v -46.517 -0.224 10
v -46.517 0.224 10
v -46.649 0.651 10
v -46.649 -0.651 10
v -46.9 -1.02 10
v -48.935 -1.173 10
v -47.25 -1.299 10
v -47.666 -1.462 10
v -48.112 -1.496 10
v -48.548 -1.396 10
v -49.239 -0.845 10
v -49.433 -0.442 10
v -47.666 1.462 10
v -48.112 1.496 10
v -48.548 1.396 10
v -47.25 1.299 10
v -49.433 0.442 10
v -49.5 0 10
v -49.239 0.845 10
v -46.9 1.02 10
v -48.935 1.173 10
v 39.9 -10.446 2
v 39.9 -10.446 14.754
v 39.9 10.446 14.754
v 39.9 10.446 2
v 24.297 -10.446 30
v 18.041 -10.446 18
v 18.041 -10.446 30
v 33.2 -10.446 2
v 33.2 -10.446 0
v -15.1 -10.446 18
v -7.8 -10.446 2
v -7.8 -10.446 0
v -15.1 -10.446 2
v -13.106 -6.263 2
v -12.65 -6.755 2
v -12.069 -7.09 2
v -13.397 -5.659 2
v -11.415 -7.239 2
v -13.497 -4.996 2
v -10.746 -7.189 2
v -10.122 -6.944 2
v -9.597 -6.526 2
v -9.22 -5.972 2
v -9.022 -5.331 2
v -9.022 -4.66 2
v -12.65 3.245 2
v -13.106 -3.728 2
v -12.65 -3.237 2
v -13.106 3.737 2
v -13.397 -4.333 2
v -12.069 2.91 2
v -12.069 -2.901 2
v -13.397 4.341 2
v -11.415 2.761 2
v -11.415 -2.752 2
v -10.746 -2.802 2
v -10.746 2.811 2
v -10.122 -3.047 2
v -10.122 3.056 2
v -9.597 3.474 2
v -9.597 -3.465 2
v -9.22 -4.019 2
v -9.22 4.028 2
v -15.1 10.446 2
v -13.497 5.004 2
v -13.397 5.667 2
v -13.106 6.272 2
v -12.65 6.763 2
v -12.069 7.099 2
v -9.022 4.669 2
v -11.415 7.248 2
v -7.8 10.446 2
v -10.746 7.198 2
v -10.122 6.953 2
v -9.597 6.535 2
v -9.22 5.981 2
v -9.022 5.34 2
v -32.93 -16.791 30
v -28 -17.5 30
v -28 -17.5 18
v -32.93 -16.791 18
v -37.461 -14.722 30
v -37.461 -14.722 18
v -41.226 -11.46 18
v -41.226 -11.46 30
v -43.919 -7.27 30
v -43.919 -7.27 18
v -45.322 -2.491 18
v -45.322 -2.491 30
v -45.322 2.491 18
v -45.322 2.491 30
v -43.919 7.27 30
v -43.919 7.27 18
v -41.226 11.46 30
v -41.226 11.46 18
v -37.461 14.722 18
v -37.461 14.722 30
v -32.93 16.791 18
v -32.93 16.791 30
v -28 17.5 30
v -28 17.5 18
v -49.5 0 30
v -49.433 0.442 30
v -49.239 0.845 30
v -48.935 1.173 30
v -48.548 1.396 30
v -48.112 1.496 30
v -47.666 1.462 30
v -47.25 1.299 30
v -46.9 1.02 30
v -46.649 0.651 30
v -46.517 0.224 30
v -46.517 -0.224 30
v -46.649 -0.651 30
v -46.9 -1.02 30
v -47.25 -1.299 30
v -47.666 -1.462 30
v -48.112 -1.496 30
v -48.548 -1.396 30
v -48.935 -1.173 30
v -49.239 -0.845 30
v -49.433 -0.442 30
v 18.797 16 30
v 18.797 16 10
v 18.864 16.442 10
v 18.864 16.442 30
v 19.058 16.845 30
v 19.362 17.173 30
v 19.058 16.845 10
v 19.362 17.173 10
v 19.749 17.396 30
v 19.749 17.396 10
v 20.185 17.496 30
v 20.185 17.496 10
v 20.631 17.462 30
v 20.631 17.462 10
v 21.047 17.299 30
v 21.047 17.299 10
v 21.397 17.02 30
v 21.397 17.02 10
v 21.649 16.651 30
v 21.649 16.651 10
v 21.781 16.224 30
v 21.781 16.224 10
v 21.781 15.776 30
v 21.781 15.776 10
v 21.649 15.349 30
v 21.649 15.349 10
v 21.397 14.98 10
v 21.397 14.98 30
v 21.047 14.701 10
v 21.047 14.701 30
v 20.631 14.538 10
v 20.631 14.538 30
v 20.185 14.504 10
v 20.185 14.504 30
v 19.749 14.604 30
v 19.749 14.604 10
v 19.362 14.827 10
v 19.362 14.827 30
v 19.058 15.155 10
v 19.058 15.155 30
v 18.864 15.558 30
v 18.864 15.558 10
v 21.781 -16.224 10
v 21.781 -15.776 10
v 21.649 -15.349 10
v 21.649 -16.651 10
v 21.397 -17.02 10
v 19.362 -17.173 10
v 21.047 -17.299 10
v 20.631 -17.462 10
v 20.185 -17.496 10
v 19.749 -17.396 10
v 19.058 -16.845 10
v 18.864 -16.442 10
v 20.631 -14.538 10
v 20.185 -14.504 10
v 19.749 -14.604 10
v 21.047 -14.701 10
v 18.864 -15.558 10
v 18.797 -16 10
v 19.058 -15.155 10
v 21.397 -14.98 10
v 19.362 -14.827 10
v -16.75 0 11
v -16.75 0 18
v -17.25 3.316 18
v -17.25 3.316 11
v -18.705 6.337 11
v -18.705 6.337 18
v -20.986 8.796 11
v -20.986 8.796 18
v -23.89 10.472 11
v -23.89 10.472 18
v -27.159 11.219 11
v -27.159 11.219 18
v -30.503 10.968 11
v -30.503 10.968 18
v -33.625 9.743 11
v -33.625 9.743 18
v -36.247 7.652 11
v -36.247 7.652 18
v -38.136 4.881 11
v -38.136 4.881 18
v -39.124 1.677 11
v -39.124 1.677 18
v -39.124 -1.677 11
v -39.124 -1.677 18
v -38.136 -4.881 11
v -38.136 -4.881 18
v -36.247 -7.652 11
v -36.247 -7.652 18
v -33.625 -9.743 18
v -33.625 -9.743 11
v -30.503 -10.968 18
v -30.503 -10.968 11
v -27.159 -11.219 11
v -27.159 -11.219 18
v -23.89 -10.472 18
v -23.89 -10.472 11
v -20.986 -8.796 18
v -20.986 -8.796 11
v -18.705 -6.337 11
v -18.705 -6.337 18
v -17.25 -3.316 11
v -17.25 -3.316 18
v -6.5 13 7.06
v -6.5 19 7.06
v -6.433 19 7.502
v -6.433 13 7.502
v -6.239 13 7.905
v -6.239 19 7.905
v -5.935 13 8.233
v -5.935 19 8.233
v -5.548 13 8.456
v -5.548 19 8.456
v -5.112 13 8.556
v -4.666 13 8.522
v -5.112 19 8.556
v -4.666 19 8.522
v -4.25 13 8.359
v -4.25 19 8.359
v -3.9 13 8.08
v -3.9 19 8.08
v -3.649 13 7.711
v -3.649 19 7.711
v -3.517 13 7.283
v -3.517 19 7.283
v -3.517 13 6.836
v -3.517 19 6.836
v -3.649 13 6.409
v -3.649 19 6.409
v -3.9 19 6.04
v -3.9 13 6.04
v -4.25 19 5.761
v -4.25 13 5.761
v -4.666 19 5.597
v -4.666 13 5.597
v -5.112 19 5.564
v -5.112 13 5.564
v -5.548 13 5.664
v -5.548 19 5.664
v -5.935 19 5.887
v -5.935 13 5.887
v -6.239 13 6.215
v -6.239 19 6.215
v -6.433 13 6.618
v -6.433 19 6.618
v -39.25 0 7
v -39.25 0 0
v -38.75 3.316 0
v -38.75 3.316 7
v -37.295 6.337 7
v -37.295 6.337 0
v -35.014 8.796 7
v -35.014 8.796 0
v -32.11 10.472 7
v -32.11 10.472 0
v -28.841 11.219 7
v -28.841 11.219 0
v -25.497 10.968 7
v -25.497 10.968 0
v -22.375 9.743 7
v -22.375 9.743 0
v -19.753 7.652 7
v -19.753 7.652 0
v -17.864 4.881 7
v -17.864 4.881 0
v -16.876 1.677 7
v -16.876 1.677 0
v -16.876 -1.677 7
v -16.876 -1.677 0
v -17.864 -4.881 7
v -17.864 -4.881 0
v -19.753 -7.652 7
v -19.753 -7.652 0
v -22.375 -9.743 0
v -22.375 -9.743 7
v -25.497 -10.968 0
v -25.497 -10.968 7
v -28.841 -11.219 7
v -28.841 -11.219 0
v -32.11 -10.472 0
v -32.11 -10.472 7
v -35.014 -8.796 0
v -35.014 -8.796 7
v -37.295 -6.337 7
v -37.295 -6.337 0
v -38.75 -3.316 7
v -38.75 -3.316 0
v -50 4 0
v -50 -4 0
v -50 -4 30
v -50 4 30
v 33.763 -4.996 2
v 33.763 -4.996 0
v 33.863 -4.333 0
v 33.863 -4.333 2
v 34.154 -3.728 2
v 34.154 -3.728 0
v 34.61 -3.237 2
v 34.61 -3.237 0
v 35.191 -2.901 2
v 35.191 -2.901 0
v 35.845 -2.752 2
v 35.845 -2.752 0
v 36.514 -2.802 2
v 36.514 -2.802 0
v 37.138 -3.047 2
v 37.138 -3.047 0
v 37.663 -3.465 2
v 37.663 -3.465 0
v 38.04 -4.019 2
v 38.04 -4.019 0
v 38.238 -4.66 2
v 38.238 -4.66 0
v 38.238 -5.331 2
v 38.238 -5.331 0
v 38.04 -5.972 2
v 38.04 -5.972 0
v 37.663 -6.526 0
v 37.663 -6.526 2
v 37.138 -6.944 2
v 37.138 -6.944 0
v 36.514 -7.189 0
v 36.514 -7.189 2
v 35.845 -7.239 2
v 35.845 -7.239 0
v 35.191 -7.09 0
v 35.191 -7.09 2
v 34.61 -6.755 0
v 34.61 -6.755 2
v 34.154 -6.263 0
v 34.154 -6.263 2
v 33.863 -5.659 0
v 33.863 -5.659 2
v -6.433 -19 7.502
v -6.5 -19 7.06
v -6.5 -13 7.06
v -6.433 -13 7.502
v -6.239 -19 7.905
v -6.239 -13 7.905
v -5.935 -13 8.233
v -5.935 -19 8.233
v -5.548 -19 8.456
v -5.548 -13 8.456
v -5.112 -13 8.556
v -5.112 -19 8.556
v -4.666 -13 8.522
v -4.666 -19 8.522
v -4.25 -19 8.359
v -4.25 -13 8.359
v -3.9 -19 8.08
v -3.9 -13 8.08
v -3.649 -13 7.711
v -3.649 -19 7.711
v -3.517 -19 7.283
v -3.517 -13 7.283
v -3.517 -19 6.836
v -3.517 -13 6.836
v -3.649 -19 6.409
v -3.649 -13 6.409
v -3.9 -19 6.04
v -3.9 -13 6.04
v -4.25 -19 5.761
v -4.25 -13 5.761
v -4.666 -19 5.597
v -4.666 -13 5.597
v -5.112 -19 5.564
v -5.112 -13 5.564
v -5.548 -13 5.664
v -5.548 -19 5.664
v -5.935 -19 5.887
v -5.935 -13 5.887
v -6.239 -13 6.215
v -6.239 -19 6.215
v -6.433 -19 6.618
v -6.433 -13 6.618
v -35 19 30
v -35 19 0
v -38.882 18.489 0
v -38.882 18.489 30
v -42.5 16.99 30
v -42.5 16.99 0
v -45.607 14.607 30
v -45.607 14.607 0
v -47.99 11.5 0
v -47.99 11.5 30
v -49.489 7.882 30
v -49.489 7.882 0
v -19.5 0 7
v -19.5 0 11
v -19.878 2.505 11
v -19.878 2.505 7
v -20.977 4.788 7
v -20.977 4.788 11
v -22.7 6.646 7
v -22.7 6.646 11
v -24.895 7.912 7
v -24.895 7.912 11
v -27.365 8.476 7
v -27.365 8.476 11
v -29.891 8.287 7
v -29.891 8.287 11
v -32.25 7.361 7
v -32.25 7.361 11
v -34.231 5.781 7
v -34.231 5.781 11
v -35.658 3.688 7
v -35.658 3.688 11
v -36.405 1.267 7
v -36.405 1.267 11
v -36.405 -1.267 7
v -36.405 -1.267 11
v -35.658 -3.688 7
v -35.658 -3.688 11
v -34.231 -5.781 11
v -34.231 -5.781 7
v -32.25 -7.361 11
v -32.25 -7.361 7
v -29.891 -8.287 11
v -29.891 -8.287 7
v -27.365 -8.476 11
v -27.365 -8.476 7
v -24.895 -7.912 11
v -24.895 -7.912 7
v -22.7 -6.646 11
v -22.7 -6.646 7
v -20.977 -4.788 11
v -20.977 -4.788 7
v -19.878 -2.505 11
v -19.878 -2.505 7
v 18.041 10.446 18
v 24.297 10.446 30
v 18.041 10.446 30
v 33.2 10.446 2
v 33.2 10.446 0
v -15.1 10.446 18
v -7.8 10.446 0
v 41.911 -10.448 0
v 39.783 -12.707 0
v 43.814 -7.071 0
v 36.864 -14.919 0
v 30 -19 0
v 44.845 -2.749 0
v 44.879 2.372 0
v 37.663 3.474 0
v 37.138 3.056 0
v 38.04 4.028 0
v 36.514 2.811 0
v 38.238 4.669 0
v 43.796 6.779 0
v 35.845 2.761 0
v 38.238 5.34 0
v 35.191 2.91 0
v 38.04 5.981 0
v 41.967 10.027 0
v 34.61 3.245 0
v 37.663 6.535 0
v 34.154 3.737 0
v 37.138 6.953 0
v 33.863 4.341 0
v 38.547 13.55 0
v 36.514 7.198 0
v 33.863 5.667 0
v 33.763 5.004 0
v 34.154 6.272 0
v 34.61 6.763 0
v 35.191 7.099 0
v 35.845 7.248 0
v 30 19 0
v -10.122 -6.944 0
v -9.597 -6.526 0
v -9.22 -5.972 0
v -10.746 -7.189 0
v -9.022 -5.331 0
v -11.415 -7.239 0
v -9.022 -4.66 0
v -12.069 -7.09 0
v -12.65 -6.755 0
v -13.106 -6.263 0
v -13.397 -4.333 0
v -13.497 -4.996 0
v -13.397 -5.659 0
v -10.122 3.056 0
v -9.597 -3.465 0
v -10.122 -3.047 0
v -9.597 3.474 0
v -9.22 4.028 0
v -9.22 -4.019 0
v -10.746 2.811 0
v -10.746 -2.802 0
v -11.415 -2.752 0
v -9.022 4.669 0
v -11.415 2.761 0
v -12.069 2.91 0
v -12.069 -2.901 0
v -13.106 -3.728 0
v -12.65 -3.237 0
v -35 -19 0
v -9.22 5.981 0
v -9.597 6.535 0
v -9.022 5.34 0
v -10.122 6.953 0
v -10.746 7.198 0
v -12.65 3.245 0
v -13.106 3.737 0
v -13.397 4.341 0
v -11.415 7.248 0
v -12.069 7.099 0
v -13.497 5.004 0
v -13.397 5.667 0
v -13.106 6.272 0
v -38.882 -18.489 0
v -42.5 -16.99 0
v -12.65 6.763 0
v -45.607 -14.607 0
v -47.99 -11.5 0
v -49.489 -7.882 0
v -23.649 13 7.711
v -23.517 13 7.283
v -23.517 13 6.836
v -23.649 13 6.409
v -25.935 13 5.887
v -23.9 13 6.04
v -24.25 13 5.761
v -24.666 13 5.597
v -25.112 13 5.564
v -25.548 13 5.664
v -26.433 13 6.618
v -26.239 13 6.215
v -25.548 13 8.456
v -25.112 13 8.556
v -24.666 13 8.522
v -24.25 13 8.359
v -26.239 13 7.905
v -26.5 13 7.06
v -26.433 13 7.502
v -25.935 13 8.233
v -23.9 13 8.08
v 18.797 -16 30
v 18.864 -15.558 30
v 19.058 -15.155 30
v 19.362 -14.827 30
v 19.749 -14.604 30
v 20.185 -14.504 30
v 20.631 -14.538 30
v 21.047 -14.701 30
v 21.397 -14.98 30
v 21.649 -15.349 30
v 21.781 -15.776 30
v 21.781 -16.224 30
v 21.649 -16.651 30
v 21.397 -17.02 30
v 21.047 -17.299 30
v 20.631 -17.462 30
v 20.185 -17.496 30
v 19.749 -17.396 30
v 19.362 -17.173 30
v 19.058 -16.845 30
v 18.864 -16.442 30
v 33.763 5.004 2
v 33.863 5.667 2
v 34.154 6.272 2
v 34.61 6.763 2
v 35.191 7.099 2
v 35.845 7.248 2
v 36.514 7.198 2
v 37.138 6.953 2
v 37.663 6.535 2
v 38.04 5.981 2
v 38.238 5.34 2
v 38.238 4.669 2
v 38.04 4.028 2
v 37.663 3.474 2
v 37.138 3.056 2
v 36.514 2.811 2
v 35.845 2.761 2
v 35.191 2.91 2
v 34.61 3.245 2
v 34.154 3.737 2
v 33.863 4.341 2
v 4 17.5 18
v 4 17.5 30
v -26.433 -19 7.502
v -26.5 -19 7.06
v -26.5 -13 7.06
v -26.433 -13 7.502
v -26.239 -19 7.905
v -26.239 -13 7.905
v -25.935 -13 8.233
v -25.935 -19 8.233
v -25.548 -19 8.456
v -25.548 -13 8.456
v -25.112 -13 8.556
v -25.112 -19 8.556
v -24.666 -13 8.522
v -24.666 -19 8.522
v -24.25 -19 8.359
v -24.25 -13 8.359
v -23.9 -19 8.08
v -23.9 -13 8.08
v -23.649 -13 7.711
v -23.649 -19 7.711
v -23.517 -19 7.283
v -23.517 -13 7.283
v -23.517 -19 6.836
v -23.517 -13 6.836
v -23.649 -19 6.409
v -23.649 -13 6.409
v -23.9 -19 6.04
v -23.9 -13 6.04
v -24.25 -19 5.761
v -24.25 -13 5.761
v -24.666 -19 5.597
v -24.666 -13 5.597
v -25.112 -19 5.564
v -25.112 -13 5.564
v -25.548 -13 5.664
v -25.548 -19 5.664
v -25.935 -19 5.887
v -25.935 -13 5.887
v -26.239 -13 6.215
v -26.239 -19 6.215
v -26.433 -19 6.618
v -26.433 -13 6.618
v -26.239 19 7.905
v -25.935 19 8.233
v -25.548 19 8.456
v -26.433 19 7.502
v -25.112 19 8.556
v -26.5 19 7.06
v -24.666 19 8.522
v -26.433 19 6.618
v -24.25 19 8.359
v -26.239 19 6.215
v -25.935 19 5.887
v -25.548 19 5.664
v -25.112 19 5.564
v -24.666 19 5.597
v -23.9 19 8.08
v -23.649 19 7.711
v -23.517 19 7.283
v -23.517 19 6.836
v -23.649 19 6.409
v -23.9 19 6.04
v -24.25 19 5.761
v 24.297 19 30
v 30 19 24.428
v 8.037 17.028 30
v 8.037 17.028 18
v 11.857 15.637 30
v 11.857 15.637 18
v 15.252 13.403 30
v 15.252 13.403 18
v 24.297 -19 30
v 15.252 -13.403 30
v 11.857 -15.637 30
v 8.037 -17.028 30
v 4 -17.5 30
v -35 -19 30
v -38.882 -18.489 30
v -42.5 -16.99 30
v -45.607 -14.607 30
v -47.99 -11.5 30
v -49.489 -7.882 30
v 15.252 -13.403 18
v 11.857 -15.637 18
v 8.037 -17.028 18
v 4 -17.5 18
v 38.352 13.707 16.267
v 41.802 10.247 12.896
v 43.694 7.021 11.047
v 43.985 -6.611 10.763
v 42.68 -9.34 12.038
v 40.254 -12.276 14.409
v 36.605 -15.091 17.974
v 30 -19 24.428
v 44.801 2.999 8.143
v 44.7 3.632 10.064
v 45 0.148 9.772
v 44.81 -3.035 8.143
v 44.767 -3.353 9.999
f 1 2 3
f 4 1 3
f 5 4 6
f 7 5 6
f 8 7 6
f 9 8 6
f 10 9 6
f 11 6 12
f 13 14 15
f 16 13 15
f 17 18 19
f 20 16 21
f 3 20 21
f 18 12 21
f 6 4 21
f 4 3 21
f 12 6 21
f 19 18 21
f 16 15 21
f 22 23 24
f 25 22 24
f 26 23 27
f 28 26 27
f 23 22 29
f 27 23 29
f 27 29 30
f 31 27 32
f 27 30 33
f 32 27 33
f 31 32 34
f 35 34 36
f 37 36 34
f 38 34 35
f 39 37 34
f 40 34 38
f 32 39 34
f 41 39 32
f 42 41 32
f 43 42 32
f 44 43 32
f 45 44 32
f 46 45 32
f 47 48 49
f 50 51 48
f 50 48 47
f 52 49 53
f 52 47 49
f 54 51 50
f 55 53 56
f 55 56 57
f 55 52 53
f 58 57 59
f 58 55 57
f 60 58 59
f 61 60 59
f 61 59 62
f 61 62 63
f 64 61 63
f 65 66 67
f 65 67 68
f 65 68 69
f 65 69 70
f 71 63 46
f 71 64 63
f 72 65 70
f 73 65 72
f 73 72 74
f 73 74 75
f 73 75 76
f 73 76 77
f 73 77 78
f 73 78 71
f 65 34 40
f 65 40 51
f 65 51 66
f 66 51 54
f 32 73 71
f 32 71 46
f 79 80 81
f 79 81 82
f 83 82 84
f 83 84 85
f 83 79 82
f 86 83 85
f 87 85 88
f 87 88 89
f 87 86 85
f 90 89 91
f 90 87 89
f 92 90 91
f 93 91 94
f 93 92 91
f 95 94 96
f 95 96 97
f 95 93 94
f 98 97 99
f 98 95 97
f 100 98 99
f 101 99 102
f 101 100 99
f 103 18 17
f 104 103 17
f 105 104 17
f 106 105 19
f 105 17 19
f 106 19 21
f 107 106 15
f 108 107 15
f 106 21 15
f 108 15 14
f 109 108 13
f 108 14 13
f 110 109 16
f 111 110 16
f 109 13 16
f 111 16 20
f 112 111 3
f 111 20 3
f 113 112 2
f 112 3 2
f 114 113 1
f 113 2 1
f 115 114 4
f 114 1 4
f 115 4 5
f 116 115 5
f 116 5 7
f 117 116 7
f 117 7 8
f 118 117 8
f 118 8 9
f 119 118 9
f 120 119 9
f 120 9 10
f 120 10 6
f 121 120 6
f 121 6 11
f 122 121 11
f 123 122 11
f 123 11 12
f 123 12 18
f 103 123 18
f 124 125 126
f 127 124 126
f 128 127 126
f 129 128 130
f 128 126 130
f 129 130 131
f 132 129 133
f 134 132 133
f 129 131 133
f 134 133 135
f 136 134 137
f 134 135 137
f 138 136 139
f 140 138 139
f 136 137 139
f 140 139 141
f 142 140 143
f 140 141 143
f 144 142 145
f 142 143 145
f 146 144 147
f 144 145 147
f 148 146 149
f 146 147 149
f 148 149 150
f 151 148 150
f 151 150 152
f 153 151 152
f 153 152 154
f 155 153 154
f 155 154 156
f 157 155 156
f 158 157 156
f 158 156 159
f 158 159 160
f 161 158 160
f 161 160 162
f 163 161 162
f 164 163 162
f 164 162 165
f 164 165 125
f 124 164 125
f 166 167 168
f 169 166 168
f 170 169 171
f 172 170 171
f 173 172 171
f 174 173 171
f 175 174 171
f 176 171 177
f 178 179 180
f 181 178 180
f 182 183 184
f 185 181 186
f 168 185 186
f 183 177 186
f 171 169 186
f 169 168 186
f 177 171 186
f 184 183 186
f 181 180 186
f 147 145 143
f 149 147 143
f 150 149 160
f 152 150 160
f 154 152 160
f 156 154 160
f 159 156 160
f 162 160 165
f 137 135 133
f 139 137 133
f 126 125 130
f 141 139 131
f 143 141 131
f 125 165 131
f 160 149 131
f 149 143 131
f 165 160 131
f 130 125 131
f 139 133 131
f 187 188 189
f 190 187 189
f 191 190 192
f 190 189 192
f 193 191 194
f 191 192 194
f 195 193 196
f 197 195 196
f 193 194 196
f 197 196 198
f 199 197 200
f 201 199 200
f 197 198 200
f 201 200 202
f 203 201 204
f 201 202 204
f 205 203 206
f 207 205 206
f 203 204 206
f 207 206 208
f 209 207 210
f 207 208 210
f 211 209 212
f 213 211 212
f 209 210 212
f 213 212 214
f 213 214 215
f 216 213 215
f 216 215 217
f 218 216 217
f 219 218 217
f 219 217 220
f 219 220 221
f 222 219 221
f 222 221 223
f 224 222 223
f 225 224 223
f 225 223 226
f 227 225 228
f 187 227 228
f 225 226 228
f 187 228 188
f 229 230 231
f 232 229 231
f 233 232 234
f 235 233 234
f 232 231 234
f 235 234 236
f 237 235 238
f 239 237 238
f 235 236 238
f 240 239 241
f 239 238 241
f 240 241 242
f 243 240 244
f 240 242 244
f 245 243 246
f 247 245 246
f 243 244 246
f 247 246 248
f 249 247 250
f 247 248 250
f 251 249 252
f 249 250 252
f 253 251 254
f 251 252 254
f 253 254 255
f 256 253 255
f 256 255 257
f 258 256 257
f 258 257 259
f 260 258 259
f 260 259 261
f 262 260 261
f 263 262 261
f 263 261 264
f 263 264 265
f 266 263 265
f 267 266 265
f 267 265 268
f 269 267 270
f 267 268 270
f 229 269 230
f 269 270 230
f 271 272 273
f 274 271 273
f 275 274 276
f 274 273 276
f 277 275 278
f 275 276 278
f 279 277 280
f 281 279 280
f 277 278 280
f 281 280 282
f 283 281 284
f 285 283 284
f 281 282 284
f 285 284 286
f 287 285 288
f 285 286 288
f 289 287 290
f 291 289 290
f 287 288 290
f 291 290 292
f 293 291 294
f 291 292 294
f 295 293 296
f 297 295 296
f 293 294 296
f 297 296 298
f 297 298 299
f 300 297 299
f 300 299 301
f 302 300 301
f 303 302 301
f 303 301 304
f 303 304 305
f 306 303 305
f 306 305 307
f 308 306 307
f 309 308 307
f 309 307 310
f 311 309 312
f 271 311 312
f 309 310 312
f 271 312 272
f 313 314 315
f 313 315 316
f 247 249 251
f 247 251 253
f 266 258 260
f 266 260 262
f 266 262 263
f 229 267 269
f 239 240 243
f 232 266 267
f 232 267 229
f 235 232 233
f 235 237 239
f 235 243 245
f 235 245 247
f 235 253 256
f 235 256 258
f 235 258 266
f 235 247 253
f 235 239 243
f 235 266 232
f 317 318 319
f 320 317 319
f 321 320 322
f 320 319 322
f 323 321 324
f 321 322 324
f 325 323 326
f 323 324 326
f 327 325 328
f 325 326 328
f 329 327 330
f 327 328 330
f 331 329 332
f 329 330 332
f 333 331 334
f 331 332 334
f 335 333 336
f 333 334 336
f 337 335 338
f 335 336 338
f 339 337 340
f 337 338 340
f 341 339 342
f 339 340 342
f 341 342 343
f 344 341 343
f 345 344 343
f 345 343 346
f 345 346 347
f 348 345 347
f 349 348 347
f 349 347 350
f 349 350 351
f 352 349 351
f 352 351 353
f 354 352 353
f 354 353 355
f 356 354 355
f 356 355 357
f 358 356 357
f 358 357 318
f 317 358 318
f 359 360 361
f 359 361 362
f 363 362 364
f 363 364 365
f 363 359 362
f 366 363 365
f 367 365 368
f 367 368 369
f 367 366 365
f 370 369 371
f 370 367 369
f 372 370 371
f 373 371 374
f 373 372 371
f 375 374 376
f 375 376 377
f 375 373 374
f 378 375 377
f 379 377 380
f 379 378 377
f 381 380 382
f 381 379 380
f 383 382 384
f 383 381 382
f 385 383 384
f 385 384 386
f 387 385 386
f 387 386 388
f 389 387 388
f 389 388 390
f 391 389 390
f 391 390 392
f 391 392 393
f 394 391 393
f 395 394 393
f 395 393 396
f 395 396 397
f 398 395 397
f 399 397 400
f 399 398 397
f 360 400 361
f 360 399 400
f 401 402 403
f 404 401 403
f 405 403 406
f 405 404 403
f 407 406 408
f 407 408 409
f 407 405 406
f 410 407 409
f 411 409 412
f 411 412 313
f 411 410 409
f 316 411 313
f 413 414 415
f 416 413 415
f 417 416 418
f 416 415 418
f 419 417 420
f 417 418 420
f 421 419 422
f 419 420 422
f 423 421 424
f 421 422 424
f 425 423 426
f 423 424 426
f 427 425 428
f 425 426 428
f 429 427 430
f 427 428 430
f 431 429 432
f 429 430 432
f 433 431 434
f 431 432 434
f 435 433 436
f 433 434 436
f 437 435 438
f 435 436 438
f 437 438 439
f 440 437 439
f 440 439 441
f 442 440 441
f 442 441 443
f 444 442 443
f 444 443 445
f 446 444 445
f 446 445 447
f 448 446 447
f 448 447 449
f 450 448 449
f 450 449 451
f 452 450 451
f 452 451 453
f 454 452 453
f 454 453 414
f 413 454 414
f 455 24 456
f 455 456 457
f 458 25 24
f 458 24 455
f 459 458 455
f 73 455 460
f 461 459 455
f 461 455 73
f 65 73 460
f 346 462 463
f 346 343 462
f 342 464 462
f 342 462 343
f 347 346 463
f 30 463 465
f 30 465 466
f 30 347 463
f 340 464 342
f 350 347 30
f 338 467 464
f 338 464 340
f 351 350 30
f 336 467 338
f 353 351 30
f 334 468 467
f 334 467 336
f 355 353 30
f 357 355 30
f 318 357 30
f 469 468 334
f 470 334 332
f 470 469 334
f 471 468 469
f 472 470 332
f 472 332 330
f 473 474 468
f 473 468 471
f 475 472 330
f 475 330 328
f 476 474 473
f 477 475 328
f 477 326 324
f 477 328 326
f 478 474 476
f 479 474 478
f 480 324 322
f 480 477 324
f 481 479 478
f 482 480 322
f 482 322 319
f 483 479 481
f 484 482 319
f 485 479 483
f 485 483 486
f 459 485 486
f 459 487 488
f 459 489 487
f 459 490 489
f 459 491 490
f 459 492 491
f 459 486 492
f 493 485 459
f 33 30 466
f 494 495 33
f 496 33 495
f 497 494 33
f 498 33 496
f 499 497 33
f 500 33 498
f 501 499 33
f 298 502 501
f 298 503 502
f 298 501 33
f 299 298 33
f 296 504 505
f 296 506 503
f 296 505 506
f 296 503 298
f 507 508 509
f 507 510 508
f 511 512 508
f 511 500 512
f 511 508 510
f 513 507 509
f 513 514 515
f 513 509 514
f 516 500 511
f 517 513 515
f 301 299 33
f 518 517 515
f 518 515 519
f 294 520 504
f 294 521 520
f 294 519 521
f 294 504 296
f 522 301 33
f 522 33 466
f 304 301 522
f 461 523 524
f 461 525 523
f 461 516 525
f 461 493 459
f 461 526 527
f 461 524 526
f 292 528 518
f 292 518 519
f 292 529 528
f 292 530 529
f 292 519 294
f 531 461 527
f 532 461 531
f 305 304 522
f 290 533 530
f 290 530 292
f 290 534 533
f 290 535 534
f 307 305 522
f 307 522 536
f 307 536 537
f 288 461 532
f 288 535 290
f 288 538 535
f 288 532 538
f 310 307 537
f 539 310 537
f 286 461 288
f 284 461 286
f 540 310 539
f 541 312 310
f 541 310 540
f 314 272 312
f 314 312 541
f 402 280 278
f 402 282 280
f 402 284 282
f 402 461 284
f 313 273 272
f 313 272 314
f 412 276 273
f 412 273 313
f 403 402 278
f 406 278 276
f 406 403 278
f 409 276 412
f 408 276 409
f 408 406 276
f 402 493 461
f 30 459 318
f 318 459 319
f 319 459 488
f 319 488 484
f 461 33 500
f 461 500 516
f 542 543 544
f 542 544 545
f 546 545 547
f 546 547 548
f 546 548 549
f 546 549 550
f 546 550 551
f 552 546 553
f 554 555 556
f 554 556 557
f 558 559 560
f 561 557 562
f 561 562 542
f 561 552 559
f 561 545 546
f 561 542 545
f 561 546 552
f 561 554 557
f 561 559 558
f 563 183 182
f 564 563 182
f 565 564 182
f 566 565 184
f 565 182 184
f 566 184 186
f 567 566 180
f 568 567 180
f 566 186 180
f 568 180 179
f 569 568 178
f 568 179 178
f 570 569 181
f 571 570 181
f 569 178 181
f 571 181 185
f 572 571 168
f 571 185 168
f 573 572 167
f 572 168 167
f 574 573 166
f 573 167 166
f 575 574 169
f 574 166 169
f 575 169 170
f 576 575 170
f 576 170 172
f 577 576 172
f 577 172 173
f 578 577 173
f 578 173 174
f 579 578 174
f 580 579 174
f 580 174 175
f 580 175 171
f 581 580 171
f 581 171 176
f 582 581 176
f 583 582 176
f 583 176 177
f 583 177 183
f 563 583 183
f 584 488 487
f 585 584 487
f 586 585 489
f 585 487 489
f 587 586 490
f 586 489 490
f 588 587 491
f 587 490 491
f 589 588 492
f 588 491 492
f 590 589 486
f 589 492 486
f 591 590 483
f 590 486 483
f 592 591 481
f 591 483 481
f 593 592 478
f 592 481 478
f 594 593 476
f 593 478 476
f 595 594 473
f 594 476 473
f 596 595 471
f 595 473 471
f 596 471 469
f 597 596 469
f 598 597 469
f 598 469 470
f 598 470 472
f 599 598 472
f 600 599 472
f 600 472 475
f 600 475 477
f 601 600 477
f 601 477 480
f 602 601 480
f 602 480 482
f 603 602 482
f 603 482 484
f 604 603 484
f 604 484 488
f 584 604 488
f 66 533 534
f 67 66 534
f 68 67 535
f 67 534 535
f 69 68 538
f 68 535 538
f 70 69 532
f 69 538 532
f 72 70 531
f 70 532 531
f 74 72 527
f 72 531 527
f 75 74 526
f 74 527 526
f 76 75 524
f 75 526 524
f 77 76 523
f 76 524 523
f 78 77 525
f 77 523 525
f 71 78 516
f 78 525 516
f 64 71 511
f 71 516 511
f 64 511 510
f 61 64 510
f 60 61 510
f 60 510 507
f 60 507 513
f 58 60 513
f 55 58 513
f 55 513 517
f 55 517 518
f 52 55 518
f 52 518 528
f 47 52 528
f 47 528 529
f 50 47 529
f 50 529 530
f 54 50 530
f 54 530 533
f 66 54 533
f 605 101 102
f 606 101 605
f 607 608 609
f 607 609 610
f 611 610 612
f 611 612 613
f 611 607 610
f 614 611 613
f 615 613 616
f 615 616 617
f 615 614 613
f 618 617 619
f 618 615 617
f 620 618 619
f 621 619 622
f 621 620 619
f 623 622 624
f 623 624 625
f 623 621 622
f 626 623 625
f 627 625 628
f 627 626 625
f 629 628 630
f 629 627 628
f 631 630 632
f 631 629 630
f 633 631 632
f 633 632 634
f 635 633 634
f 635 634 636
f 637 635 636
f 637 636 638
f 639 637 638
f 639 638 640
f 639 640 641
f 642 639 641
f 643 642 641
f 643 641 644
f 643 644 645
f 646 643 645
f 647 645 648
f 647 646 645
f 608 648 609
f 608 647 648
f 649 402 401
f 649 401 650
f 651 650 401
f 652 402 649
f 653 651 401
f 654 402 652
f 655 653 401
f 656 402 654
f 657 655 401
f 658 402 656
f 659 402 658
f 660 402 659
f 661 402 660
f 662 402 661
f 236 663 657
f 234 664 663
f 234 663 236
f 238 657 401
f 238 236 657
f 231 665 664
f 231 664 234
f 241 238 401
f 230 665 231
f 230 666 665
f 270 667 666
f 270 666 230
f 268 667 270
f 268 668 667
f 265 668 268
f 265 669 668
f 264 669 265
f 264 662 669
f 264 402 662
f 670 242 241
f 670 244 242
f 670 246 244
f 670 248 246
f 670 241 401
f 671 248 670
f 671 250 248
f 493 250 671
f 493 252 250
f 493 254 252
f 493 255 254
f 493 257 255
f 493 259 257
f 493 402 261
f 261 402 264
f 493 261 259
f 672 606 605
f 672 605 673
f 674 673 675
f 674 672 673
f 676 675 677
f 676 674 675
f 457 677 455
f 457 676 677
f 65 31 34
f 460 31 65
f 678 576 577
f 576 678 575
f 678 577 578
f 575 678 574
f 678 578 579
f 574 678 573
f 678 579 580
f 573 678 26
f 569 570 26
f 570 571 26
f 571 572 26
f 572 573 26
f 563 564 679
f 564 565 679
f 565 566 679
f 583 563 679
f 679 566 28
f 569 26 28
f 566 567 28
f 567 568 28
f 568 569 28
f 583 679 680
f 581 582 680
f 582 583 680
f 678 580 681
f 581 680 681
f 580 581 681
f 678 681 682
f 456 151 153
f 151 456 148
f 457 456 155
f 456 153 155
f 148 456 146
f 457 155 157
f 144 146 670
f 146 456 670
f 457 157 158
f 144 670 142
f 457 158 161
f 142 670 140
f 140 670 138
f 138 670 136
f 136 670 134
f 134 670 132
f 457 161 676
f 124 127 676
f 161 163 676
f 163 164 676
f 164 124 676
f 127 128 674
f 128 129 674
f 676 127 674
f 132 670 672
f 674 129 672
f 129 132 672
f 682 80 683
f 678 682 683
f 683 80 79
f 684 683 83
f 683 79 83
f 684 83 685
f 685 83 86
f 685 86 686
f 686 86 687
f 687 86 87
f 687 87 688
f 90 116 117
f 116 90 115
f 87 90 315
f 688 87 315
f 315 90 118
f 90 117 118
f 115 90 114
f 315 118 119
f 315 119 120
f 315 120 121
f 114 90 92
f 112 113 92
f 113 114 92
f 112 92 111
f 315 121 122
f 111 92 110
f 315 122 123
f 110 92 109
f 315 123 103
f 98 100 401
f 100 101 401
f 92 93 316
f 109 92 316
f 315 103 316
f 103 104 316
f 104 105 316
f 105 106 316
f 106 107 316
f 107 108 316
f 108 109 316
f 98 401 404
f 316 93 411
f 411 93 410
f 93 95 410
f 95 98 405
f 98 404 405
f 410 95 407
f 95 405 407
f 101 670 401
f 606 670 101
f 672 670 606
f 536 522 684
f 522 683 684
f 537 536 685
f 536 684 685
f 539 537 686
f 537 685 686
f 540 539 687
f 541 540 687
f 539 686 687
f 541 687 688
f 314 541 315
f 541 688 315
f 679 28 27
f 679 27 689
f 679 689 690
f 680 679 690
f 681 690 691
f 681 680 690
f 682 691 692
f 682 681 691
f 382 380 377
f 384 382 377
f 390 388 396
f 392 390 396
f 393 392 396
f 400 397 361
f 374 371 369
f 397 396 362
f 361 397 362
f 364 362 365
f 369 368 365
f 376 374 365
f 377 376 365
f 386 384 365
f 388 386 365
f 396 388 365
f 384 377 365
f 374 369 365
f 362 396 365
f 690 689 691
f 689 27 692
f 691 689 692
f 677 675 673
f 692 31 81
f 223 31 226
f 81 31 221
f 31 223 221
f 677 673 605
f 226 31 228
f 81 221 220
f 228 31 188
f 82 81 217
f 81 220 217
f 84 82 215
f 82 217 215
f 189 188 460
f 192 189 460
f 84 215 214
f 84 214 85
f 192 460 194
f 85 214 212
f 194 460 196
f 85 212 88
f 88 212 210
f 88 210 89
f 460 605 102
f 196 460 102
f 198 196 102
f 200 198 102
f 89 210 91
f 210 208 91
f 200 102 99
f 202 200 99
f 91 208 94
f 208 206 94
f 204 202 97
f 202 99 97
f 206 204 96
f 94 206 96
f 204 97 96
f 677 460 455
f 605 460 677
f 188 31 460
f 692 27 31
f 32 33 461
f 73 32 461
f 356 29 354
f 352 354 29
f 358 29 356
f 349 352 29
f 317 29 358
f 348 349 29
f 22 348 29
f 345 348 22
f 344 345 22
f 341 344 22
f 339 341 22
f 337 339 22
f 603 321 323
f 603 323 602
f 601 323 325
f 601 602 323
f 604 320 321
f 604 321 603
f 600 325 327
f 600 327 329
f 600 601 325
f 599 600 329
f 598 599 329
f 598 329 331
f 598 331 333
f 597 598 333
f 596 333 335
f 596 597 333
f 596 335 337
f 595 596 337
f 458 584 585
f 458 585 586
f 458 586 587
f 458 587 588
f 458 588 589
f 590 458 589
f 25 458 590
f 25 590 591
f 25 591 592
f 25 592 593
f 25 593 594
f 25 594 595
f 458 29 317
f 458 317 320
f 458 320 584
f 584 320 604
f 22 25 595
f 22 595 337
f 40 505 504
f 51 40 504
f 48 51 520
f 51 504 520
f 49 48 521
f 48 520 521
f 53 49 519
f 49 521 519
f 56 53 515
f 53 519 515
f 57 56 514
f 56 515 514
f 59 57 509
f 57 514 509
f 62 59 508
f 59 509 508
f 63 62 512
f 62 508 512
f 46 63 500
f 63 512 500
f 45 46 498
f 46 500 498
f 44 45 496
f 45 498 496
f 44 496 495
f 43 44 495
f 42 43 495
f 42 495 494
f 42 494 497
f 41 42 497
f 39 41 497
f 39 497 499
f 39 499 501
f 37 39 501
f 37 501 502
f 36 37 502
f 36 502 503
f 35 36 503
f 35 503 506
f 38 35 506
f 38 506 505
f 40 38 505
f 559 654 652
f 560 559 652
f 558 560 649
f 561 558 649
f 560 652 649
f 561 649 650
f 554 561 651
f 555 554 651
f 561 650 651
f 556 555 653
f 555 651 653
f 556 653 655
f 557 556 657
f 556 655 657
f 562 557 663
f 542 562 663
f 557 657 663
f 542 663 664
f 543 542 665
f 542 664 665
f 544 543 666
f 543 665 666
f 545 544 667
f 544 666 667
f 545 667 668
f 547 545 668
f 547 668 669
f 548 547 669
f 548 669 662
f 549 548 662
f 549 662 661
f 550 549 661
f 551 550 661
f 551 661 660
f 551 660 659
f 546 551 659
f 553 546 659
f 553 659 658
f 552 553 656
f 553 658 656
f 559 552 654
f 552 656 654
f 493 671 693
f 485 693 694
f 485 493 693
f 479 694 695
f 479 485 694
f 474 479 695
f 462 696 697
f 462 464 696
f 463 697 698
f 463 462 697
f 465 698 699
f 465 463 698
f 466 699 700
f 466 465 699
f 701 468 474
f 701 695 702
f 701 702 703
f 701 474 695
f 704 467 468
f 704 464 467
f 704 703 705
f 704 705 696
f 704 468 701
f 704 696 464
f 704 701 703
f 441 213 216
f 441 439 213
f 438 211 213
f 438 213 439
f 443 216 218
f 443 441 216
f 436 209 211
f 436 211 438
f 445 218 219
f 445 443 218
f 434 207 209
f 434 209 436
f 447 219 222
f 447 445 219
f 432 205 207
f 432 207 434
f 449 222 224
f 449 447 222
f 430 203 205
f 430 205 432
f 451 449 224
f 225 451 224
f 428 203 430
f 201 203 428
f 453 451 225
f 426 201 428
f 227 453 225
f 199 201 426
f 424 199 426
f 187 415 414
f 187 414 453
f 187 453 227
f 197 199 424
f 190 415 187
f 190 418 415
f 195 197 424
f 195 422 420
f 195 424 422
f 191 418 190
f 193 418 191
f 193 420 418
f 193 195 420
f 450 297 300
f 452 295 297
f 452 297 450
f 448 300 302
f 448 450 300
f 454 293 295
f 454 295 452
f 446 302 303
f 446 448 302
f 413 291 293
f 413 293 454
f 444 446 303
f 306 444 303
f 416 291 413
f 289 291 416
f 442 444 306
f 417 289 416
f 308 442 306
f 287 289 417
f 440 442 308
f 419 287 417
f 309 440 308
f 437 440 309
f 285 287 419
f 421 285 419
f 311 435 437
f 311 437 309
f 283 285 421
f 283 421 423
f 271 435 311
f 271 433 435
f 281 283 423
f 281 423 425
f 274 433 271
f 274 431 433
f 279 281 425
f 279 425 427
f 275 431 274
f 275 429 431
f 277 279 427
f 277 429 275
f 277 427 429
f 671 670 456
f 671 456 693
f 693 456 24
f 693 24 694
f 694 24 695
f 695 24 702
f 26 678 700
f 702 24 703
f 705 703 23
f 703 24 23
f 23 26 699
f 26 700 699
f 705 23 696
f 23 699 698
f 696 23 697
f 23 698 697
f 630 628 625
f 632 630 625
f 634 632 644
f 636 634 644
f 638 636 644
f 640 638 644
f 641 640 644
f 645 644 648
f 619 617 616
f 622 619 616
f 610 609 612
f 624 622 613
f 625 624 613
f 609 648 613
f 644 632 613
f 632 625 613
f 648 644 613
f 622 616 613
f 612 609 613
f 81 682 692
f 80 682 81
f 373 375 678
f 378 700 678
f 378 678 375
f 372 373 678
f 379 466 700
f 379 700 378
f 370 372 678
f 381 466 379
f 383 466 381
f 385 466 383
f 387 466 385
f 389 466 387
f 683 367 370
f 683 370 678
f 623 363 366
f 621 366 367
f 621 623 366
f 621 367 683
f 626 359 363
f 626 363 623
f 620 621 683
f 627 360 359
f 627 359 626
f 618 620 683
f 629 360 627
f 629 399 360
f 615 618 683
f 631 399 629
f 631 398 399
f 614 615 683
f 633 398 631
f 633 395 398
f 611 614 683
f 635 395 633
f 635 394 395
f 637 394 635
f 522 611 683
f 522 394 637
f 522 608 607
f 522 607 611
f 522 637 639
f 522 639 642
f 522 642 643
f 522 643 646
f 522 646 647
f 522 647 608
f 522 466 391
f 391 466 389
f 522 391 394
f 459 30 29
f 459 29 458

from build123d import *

# Parameters (mm, degrees)
EXTRUDE1_DEPTH                 = 30
EXTRUDE2_DEPTH                 = 12
SKETCH4_R                      = 11.25
EXTRUDE3_DEPTH                 = 7
SKETCH5_R                      = 8.5
EXTRUDE4_DEPTH                 = 12.0000001
SKETCH6_R                      = 11.25
EXTRUDE5_DEPTH                 = 7
SKETCH8_R                      = 2.5
EXTRUDE6_DEPTH                 = 19.0000001
SKETCH7_W                      = 41
SKETCH7_H                      = 20.891455382
EXTRUDE7_DEPTH                 = 31.0000001
SKETCH10_W                     = 55
SKETCH10_H                     = 20.891455382
EXTRUDE8_DEPTH                 = 28
FILLET1_R                      = 15
EXTRUDE17_DEPTH                = 20.0000001
EXTRUDE17_DEPTH_BACK           = 20.0000001
SKETCH19_R                     = 1.5
EXTRUDE19_DEPTH                = 6
F_4_5_4_5_DIAMETER_HOLE1_D     = 4.5
F_4_5_4_5_DIAMETER_HOLE1_DEPTH = 20
F_3_0_3_DIAMETER_HOLE1_D       = 3
F_3_0_3_DIAMETER_HOLE1_DEPTH   = 20


with BuildPart() as part:
    # Sketch1 → Extrude1 (new body)
    with BuildSketch(Plane.XY):
        with BuildLine():
            Line((-50, 19), (30, 19))
            add(Edge.make_bspline(
                [(30, 19), (36.561245044, 15.211863407), (45.16011468, 10.828695002), (44.967612, -11.088320981), (37.933016475, -14.419870803), (30, -19)],
                knots=[0, 0, 0, 0, 0.44562934, 0.54562934, 1, 1, 1, 1], degree=3))
            Line((30, -19), (-50, -19))
            Line((-50, -19), (-50, 19))
        make_face()
    extrude(amount=EXTRUDE1_DEPTH)

    # Sketch2 → Extrude2 (cut)
    with BuildSketch(Plane.XY.offset(30)):
        with BuildLine():
            Line((-28, 17.5), (4, 17.5))
            ThreePointArc((4, 17.5), (21.5, 0), (4, -17.5))
            Line((4, -17.5), (-28, -17.5))
            ThreePointArc((-28, -17.5), (-45.5, 0), (-28, 17.5))
        make_face()
    extrude(amount=-EXTRUDE2_DEPTH, mode=Mode.SUBTRACT)

    # Sketch4 → Extrude3 (cut)
    with BuildSketch(Plane.XY.offset(18)):
        with Locations((-28, 0)):
            Circle(SKETCH4_R)
    extrude(amount=-EXTRUDE3_DEPTH, mode=Mode.SUBTRACT)

    # Sketch5 → Extrude4 (cut, through all)
    with BuildSketch(Plane.XY.offset(11)):
        with Locations((-28, 0)):
            Circle(SKETCH5_R)
    extrude(amount=-EXTRUDE4_DEPTH, mode=Mode.SUBTRACT)

    # Sketch6 → Extrude5 (cut)
    with BuildSketch(Plane(origin=(0, 0, 0), x_dir=(-1, 0, 0), z_dir=(0, 0, -1))):
        with Locations((28, 0)):
            Circle(SKETCH6_R)
    extrude(amount=-EXTRUDE5_DEPTH, mode=Mode.SUBTRACT)

    # Sketch8 → Extrude6 (cut, through all)
    with BuildSketch(Plane.XY.offset(18)):
        with Locations((2, 0)):
            Circle(SKETCH8_R)
    extrude(amount=-EXTRUDE6_DEPTH, mode=Mode.SUBTRACT)

    # Sketch7 → Extrude7 (cut, through all)
    with BuildSketch(Plane(origin=(0, 0, 0), x_dir=(-1, 0, 0), z_dir=(0, 0, -1))):
        with Locations((-12.7, 0)):
            Rectangle(SKETCH7_W, SKETCH7_H)
    extrude(amount=-EXTRUDE7_DEPTH, mode=Mode.SUBTRACT)

    # Sketch10 → Extrude8 (cut)
    with BuildSketch(Plane.XY.offset(30)):
        with Locations((12.4, 0)):
            Rectangle(SKETCH10_W, SKETCH10_H)
    extrude(amount=-EXTRUDE8_DEPTH, mode=Mode.SUBTRACT)

    # Fillet1
    fillet1_edges = [part.edges().sort_by_distance(p)[0] for p in [
        (-50, 19, 15),
        (-50, -19, 15),
    ]]
    fillet(fillet1_edges, radius=FILLET1_R)

    # Sketch17 → Extrude17 (cut, two sides)
    with BuildSketch(Plane(origin=(0, 0, 0), x_dir=(1, 0, 0), z_dir=(0, 1, 0))) as extrude17_sk:
        Polygon((55, 0), (55, -30), (24.297369985, -30), align=None)
    extrude(amount=EXTRUDE17_DEPTH, mode=Mode.SUBTRACT)
    extrude(extrude17_sk.sketch, amount=-EXTRUDE17_DEPTH_BACK, mode=Mode.SUBTRACT)

    # Sketch19 → Extrude19 (cut)
    with BuildSketch(Plane(origin=(0, 19, 0), x_dir=(-1, 0, 0), z_dir=(0, 1, 0))):
        with Locations((5, 7.059888019)):
            Circle(SKETCH19_R)
        with Locations((25, 7.059888019)):
            Circle(SKETCH19_R)
    extrude19 = extrude(amount=-EXTRUDE19_DEPTH, mode=Mode.SUBTRACT)

    # Mirror4: Extrude19 across plane
    add(extrude19.mirror(Plane.ZX), mode=Mode.SUBTRACT)

    # Ø4.5 (4.5) Diameter Hole1
    with Locations(Plane(origin=(36.013200545, 5.004272309, 2), x_dir=(1, 0, 0), z_dir=(0, 0, 1))):
        with Locations((0, 0), (0, -10), (-47.26, 0), (-47.26, -10)):
            Hole(F_4_5_4_5_DIAMETER_HOLE1_D / 2, depth=F_4_5_4_5_DIAMETER_HOLE1_DEPTH)

    # Ø3.0 (3) Diameter Hole1
    with Locations(Plane(origin=(-48, 0, 30), x_dir=(1, 0, 0), z_dir=(0, 0, 1))):
        with Locations((0, 0), (68.297369985, -16), (68.297369985, 16)):
            Hole(F_3_0_3_DIAMETER_HOLE1_D / 2, depth=F_3_0_3_DIAMETER_HOLE1_DEPTH)


solid = part.part
